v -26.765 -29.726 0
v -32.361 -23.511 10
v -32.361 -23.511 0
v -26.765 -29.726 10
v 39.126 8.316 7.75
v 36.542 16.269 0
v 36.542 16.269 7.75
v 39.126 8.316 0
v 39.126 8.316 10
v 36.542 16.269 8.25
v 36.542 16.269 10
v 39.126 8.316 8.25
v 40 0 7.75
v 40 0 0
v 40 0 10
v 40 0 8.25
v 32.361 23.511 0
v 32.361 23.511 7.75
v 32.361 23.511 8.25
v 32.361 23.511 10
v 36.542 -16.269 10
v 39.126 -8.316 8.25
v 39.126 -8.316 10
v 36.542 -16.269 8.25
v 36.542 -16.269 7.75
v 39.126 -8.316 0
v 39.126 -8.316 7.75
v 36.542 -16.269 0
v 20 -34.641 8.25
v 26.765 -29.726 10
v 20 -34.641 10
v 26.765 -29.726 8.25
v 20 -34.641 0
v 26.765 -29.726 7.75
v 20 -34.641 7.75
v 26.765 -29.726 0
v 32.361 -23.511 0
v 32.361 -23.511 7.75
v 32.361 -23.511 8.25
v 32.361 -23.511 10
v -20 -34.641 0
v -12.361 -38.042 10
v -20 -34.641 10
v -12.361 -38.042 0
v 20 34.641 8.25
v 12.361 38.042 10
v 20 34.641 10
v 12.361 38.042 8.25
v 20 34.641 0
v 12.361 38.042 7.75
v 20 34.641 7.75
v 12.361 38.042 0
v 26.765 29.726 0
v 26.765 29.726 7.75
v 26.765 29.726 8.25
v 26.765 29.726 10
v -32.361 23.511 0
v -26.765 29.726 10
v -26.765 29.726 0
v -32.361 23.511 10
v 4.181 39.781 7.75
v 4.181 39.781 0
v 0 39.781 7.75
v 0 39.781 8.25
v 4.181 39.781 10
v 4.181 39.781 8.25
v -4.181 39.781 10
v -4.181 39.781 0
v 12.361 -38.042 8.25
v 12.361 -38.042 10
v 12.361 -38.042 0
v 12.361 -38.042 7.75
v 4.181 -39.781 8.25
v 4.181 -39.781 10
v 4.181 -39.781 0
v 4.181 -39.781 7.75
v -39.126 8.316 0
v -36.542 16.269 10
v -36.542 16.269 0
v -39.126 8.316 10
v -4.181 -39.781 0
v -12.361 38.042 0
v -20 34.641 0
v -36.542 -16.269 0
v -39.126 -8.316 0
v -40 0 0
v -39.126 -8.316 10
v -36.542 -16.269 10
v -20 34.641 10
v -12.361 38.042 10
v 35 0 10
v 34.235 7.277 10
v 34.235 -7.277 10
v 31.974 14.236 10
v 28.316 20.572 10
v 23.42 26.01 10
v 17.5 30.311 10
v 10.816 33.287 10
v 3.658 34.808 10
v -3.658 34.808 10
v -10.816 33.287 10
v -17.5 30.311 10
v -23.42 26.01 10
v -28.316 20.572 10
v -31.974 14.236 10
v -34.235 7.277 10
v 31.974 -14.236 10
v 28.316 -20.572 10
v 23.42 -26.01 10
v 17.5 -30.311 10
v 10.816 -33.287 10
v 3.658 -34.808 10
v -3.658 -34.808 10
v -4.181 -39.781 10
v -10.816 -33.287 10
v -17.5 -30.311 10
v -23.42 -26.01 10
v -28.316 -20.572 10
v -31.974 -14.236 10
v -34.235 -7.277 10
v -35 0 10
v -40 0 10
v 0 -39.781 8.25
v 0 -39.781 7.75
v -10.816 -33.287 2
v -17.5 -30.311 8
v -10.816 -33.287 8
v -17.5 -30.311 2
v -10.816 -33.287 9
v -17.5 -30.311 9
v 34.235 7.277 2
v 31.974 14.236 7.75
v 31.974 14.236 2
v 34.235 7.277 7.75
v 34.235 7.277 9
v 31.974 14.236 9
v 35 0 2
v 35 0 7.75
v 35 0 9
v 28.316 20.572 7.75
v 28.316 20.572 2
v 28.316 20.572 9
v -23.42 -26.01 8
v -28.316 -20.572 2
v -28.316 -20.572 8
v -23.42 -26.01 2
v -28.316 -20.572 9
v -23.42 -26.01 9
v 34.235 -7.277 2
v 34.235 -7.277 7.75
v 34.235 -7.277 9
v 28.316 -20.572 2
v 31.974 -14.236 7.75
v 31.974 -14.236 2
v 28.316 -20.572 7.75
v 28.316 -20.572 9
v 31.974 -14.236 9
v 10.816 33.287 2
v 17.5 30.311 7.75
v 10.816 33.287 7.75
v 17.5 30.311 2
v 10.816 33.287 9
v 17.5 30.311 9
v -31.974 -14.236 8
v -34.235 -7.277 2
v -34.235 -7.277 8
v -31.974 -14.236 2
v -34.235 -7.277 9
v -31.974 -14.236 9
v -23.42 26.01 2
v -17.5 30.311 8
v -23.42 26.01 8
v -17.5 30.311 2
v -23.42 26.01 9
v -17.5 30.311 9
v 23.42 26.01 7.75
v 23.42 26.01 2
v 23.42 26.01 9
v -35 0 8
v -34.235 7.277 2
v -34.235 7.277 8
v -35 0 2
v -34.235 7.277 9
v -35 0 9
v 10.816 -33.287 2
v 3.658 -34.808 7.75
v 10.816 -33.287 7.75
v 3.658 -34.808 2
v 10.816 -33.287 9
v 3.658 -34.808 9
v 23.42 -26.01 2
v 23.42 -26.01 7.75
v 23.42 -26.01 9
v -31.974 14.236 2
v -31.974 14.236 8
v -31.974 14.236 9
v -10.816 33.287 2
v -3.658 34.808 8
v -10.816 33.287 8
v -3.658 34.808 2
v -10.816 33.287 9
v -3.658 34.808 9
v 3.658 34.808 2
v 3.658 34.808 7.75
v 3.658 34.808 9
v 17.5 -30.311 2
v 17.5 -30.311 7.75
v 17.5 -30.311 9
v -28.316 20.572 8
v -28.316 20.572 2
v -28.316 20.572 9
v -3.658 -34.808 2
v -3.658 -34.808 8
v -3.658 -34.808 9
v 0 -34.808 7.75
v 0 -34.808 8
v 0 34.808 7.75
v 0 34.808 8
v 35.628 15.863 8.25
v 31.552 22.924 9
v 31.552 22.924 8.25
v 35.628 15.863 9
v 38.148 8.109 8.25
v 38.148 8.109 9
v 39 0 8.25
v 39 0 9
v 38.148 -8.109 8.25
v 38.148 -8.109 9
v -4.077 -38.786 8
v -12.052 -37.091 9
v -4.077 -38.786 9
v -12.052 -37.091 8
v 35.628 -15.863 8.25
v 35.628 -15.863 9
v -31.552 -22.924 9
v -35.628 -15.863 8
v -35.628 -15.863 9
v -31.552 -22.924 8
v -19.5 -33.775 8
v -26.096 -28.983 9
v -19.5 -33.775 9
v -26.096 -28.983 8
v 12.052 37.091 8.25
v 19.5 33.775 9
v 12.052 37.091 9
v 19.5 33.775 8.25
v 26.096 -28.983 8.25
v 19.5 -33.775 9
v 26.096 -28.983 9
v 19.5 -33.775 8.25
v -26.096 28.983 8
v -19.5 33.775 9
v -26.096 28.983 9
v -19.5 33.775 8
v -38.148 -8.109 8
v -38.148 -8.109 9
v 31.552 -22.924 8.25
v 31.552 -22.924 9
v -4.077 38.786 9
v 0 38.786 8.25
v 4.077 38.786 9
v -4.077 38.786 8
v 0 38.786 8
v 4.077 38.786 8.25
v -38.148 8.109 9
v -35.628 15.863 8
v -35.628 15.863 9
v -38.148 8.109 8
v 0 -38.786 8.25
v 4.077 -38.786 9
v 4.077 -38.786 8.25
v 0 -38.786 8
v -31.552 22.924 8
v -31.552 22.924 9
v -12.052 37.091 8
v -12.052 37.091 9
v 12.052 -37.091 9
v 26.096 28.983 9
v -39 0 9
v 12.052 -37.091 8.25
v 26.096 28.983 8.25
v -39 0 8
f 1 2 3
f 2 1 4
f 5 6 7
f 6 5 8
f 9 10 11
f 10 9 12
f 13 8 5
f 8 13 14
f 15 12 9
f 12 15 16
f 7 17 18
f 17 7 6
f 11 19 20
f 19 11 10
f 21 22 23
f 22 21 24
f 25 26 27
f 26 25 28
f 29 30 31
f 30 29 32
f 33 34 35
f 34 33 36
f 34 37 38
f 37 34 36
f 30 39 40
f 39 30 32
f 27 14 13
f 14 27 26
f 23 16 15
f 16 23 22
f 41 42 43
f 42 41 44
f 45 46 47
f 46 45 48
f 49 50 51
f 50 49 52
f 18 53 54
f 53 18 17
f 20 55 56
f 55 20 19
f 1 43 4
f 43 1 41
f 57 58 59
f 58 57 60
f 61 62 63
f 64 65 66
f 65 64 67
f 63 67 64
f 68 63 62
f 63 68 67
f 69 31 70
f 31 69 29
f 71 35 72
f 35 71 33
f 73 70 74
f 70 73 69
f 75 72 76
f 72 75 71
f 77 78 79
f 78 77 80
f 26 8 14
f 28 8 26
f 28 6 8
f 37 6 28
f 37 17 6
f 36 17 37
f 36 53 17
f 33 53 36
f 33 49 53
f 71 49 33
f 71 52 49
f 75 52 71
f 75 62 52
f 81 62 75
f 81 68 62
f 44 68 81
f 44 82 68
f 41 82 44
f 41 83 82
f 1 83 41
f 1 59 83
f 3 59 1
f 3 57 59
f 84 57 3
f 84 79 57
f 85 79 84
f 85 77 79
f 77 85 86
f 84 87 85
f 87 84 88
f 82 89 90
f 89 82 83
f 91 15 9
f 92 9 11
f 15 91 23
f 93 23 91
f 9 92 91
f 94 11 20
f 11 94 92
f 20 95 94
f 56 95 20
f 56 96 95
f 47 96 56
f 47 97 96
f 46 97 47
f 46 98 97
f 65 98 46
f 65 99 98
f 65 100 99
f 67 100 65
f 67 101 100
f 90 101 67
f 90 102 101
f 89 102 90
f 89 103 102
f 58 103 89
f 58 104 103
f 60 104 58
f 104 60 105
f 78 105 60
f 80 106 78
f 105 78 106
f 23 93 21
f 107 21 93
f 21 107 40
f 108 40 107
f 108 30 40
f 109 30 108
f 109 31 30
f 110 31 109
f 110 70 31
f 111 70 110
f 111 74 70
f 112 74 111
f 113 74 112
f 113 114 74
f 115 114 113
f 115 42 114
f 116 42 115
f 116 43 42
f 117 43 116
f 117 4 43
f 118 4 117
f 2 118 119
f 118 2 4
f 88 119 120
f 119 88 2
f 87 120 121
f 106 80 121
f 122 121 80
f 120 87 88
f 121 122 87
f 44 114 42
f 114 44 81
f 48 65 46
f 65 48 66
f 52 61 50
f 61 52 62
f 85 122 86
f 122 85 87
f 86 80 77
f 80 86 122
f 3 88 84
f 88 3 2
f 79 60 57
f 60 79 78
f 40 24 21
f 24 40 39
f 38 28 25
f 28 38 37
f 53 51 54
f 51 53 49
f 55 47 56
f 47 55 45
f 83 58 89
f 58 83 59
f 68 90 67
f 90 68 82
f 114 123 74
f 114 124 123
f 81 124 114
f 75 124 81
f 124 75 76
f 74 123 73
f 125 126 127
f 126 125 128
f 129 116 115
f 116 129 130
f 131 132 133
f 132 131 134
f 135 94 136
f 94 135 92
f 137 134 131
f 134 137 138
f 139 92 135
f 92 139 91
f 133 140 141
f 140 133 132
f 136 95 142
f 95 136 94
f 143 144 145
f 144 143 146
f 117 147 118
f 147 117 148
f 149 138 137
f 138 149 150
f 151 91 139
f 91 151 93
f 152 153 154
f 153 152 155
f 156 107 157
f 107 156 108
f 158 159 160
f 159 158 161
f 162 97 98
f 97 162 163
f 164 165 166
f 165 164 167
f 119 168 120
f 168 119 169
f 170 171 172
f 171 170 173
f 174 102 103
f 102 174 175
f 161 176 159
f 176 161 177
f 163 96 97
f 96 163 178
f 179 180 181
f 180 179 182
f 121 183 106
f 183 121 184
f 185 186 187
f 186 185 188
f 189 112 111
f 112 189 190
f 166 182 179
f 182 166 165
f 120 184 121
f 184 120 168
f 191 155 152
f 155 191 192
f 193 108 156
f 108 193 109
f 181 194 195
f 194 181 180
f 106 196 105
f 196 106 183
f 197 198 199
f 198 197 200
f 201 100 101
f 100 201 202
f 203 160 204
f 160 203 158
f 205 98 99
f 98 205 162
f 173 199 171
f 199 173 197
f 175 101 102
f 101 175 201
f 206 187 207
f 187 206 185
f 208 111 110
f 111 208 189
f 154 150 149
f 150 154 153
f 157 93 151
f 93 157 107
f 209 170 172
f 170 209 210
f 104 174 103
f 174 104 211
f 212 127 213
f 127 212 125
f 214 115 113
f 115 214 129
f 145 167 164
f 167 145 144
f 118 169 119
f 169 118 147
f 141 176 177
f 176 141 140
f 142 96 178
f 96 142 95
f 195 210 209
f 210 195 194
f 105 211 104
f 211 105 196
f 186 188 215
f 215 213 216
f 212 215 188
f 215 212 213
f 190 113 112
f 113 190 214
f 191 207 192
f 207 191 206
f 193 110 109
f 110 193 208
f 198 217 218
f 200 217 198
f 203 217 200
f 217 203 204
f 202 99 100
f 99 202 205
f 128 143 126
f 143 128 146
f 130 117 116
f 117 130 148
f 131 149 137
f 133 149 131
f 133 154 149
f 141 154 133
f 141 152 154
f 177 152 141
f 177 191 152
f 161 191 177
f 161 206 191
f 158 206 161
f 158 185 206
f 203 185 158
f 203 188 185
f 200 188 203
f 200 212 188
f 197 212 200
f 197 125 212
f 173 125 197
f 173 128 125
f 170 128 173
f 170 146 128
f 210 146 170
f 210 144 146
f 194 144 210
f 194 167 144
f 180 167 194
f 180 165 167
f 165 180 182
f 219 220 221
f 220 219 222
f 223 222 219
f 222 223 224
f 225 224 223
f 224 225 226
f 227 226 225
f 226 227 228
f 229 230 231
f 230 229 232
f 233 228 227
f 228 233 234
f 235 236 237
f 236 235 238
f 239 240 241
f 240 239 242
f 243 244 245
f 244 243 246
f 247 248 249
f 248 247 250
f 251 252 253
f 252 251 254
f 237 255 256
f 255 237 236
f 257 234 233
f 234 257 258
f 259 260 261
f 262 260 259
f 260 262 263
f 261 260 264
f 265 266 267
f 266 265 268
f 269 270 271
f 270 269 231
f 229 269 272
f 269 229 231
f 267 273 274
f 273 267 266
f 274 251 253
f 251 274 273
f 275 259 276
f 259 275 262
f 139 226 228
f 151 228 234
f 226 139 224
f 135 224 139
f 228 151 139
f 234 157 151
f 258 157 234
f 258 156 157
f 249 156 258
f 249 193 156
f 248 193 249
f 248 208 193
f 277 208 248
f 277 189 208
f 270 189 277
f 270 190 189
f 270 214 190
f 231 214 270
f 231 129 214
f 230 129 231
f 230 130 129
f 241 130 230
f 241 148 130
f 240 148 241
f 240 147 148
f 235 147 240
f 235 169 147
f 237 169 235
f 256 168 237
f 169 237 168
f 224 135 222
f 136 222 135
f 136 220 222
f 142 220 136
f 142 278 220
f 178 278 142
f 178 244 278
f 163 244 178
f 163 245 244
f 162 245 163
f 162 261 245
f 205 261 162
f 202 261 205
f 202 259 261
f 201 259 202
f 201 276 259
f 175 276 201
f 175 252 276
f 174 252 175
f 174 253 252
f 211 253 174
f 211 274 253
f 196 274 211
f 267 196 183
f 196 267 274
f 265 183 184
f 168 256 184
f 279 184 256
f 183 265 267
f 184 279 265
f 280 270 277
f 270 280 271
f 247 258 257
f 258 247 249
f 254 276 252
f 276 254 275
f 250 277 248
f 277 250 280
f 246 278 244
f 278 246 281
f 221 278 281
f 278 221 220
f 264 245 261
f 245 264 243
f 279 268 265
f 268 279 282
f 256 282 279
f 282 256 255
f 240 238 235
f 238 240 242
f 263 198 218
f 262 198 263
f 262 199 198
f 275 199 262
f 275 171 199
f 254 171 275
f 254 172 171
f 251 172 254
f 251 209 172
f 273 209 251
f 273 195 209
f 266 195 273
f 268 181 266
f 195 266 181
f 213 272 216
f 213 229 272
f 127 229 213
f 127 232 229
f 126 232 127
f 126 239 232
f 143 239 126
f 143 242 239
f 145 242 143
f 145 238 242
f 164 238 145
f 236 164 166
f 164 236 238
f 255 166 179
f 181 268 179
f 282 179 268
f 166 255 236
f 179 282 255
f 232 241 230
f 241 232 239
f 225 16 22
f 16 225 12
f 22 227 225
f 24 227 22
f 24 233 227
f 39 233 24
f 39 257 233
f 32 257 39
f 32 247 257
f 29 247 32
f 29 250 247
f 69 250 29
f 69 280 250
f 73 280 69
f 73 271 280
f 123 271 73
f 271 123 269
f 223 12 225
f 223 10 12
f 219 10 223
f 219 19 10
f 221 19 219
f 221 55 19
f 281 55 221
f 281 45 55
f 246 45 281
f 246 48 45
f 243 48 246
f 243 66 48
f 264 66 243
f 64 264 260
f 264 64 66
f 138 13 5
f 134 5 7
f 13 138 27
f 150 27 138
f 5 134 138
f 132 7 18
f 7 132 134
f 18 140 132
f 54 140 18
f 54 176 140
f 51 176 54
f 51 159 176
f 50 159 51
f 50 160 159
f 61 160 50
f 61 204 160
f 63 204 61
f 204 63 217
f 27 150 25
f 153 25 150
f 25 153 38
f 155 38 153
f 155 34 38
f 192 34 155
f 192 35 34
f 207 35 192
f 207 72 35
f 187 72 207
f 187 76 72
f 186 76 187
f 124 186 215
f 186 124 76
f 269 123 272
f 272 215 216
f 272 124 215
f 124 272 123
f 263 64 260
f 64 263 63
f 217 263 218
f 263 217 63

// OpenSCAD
difference()
{
    height = 10;
    width = 40;
    brim = 5;
    floor = 2;
    slide = 1;
    base(width,height,brim,floor,slide);
    union()
    {
    translate([0,0,8])
    cylinder(r=width-slide,h =1);
    translate([width/2,0,8])
    cube([width,width*2,.5],center=true);
    }
}

module base(width,height,brim,floor,slide)
{
    difference()
    {
        cylinder(r=width,h=height); // a 20 mm cube
        translate([0,0,floor]) // start 1 mm below the surface
            cylinder(r=width - brim,h=10+1); // and go 1 mm above
    }
}
